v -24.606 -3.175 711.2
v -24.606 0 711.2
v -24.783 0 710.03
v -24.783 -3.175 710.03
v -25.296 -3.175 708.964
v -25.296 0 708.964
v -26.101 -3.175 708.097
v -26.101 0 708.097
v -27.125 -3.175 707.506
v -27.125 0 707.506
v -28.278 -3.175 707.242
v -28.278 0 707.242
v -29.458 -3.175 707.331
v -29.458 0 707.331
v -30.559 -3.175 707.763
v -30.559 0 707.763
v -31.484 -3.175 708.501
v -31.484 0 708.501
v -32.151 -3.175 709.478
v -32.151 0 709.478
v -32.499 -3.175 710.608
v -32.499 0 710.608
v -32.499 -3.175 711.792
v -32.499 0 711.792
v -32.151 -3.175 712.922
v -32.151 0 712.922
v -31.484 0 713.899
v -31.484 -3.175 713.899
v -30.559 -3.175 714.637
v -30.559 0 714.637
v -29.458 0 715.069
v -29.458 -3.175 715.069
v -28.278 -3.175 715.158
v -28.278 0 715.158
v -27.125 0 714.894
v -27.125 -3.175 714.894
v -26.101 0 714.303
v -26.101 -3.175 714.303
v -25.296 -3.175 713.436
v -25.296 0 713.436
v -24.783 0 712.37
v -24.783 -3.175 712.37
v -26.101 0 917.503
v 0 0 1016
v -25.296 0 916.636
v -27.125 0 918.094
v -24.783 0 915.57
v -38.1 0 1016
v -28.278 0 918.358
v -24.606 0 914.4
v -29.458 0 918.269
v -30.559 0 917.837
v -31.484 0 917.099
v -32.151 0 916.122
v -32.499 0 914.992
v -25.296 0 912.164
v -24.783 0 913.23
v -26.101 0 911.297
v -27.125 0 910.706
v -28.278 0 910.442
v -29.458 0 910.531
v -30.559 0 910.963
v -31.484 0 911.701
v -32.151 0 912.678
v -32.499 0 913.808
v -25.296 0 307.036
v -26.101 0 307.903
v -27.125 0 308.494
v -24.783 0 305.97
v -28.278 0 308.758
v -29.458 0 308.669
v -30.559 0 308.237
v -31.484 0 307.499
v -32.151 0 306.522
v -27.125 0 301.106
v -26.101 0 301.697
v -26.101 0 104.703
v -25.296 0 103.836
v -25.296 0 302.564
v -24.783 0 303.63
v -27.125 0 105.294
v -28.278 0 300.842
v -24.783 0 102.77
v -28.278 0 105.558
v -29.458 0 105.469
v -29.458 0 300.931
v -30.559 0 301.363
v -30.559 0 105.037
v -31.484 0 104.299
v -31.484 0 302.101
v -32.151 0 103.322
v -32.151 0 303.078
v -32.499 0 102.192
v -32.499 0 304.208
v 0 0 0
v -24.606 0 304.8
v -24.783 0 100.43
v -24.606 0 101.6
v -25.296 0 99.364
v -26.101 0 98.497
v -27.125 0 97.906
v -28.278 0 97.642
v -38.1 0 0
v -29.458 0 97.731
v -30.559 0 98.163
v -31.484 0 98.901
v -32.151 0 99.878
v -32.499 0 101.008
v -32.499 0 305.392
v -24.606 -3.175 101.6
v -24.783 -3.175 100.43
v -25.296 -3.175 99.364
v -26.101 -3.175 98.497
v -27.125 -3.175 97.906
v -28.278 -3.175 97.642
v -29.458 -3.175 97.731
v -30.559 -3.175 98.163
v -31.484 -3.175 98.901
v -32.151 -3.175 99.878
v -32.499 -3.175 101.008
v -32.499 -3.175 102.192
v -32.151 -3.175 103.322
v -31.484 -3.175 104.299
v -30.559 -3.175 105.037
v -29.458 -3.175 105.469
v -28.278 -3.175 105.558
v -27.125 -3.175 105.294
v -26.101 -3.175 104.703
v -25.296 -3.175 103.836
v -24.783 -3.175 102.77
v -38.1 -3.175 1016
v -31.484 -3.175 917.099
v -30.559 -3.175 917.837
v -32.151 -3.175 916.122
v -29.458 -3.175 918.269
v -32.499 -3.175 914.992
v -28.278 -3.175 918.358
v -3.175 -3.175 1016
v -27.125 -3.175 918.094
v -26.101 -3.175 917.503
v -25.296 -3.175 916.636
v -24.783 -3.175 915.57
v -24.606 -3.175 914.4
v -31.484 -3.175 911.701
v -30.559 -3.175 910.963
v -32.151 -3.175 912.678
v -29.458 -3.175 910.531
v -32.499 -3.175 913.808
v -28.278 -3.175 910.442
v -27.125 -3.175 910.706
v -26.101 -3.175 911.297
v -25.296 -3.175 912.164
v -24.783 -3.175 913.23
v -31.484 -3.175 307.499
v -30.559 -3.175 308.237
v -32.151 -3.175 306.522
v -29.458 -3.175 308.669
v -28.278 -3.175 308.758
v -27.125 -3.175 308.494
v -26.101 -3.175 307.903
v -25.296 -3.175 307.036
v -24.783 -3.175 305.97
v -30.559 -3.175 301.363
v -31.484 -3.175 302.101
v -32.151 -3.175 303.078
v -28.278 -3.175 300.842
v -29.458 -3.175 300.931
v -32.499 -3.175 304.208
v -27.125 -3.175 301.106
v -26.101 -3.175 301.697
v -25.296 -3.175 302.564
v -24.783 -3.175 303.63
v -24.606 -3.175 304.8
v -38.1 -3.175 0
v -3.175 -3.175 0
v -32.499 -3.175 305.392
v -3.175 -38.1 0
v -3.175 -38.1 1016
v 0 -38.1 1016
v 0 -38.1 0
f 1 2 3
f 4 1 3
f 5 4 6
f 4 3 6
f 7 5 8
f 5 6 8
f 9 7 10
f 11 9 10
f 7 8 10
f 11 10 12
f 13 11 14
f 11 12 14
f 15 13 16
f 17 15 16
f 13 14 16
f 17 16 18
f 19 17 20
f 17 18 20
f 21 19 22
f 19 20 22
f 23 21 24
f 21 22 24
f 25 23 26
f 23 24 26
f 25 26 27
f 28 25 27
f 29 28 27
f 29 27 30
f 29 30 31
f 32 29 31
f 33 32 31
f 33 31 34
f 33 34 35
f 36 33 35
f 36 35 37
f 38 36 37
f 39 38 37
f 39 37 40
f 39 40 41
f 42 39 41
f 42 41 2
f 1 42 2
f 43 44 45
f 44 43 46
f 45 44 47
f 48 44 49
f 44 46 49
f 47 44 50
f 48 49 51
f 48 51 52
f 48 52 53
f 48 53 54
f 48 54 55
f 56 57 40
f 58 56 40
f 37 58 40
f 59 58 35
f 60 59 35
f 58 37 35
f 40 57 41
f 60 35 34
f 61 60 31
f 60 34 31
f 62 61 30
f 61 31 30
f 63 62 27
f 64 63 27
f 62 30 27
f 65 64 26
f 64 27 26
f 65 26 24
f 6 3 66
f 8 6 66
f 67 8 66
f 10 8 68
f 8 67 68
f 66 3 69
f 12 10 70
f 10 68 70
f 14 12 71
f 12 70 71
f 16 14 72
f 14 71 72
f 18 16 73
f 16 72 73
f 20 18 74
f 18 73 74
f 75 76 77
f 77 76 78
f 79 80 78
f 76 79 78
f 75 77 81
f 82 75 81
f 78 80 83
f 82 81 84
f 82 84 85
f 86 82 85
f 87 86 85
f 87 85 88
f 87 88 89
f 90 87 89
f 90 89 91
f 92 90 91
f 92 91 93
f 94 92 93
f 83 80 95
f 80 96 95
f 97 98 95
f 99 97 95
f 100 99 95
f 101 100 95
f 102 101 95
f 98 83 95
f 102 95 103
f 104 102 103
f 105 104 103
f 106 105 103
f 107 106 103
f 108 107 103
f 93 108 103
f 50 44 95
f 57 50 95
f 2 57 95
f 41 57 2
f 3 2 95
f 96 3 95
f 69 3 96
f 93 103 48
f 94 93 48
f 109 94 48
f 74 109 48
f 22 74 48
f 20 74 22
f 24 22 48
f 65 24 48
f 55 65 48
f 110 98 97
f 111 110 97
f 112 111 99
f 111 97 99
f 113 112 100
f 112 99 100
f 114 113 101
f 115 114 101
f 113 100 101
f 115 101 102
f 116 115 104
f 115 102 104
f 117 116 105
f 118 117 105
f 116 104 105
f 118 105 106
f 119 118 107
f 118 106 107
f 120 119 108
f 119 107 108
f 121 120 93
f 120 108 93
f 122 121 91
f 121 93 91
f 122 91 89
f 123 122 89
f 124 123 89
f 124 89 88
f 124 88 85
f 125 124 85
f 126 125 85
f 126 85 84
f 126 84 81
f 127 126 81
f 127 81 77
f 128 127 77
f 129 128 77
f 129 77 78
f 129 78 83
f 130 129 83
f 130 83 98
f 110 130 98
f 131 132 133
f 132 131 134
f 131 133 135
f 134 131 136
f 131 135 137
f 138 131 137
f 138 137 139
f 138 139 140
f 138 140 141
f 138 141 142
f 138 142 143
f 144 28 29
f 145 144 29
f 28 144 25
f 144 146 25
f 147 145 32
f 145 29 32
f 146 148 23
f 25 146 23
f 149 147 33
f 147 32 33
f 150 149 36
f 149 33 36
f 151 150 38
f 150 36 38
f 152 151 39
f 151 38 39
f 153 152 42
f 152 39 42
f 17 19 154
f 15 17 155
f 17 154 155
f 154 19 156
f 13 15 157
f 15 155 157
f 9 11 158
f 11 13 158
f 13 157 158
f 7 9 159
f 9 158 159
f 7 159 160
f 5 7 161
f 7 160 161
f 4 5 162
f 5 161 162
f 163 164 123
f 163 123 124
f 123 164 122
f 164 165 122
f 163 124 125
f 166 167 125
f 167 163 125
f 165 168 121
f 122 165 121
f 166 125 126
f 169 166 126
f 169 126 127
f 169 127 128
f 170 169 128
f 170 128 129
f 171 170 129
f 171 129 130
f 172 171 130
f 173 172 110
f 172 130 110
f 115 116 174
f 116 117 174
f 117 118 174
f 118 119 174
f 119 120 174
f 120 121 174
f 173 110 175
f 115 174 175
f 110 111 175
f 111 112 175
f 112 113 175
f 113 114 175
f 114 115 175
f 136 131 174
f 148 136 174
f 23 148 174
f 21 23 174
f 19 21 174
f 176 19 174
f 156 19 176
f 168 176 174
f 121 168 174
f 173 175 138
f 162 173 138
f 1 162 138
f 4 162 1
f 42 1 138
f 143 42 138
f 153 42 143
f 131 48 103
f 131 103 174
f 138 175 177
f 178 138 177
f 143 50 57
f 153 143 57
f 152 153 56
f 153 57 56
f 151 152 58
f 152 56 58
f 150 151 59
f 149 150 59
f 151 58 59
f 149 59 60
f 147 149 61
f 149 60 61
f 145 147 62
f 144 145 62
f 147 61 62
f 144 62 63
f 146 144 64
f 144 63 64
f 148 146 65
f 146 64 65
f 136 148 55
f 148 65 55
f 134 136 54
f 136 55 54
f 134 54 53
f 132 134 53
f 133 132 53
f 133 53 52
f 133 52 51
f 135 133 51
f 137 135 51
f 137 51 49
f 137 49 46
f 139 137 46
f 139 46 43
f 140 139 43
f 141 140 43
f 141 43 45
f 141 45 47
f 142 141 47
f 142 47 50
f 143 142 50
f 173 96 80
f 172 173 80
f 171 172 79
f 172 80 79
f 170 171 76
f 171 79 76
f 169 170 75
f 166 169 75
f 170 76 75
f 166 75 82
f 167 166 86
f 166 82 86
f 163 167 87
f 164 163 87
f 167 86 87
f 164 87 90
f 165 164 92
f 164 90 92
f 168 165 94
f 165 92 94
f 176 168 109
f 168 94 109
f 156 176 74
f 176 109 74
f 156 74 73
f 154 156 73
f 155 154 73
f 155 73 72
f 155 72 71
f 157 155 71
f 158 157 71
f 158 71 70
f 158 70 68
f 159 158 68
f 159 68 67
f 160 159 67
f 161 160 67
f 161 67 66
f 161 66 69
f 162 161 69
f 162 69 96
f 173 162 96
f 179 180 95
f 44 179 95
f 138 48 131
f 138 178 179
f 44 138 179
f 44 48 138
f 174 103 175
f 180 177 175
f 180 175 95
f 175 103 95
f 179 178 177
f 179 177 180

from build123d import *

# Parameters (mm, degrees)
BOSS_EXTRUDE1_DEPTH = 1016
SKETCH4_R           = 3.96875
CUT_EXTRUDE3_DEPTH  = 44.45
LPATTERN1_COUNT     = 5
LPATTERN1_PITCH     = 203.2


with BuildPart() as part:
    # Sketch1 → Boss-Extrude1 (new body)
    with BuildSketch(Plane.XY):
        Polygon((0, 0), (-38.1, 0), (-38.1, -3.175), (-3.175, -3.175), (-3.175, -38.1), (0, -38.1), align=None)
    extrude(amount=BOSS_EXTRUDE1_DEPTH)

    # Sketch4 → Cut-Extrude3 (cut)
    with BuildSketch(Plane(origin=(10.670100368, 3.175, 791.563272881), x_dir=(1, 0, 0), z_dir=(0, 1, 0))):
        with Locations((-39.245100368, 689.963272881)):
            Circle(SKETCH4_R)
    cut_extrude3 = extrude(amount=-CUT_EXTRUDE3_DEPTH, mode=Mode.SUBTRACT)

    # LPattern1: Cut-Extrude3 ×5, 1 skipped
    with Locations(*[(0, 0, i * LPATTERN1_PITCH) for i in range(1, LPATTERN1_COUNT) if i not in (2,)]):
        add(cut_extrude3, mode=Mode.SUBTRACT)


solid = part.part
